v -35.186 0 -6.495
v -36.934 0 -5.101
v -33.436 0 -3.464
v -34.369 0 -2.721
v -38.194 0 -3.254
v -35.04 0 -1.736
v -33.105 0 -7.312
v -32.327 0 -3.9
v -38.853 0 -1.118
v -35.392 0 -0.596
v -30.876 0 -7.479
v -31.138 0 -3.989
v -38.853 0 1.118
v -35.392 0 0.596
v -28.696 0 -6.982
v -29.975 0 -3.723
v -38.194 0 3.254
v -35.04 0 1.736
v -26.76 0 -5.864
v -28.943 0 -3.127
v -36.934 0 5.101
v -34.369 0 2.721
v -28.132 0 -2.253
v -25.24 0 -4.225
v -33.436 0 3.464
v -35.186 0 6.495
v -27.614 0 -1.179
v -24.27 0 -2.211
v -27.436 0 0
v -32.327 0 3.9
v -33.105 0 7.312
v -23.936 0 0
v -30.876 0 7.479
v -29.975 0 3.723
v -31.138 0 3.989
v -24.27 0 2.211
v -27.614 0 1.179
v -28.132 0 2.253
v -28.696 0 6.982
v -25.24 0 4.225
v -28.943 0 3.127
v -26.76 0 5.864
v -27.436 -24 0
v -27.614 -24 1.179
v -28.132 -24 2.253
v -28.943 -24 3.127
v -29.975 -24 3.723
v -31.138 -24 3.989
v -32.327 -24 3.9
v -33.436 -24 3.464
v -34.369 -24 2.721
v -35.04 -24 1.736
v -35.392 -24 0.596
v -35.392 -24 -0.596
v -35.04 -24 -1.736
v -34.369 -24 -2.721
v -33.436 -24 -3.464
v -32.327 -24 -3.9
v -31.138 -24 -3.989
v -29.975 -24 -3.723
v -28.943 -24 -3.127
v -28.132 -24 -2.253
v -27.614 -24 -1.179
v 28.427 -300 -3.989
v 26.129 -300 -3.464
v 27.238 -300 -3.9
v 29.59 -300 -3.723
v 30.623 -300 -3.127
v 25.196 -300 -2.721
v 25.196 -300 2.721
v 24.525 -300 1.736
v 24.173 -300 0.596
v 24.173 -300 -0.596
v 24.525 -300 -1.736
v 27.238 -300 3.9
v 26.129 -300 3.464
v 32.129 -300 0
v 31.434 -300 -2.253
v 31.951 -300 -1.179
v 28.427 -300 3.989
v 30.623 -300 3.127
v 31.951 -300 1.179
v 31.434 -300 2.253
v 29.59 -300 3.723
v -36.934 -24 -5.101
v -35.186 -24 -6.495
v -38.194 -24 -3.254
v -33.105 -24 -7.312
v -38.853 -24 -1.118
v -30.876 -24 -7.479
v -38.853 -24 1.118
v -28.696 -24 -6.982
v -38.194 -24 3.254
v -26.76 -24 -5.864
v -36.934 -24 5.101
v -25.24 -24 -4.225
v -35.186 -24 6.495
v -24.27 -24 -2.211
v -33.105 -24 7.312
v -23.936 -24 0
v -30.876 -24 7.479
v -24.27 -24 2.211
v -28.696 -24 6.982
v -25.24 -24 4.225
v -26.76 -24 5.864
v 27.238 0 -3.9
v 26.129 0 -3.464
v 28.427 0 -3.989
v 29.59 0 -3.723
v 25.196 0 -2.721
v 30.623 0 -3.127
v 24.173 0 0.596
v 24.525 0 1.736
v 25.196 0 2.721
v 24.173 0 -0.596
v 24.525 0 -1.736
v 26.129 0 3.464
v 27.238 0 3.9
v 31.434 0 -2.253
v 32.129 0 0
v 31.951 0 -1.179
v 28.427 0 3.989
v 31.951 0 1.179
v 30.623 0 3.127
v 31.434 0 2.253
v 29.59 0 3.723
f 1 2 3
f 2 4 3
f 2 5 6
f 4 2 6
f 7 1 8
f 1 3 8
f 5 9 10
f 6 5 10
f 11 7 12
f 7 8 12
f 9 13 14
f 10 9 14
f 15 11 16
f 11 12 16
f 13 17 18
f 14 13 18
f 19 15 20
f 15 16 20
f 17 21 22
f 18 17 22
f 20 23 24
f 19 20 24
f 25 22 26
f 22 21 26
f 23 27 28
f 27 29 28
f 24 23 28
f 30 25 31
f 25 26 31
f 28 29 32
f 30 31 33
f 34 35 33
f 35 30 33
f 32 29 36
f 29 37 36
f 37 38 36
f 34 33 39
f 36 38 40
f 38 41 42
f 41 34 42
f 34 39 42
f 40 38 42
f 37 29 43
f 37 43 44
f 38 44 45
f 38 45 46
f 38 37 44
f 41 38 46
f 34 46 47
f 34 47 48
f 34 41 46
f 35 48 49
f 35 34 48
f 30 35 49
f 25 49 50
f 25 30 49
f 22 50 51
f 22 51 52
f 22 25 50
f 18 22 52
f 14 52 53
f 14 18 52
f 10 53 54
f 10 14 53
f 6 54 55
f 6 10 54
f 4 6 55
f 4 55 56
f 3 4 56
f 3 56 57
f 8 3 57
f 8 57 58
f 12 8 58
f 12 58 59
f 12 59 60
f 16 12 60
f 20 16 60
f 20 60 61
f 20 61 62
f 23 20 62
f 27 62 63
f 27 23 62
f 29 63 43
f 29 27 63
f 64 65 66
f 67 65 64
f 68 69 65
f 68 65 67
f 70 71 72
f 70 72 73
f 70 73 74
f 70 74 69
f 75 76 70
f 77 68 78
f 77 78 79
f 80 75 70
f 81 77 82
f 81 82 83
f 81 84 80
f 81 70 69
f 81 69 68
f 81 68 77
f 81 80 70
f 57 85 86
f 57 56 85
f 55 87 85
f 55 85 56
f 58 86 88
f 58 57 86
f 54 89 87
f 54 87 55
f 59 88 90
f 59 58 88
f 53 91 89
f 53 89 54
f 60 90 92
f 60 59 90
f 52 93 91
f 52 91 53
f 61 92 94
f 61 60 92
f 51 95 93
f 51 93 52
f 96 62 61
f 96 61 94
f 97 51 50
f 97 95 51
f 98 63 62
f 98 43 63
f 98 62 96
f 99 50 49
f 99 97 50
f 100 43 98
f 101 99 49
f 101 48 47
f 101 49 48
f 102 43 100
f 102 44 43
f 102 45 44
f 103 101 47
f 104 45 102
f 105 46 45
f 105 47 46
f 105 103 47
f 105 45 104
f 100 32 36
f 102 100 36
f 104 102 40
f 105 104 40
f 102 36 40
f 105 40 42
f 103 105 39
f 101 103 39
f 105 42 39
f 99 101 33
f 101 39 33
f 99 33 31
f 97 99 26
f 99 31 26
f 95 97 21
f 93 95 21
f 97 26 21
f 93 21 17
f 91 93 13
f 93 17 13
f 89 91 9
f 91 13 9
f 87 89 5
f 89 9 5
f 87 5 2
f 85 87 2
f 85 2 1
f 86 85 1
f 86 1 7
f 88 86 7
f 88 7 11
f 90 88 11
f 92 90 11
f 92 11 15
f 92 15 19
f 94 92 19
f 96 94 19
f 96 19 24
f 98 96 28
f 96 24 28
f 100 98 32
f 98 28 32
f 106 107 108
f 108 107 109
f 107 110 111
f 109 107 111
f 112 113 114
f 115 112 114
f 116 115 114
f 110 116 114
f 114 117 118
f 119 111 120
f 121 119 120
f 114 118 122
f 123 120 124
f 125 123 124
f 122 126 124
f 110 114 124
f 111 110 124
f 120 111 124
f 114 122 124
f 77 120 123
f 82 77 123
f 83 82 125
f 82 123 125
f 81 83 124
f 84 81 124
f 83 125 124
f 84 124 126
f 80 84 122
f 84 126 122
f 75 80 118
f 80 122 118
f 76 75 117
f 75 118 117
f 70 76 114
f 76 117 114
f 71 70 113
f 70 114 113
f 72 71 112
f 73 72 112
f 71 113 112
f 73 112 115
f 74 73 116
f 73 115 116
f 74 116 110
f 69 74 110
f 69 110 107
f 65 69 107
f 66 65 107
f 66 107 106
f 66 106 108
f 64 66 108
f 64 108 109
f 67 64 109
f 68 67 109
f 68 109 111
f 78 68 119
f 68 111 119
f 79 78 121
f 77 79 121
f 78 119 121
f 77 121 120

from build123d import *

# Parameters (mm, degrees)
F0_R     = 7.5
F0_R_2   = 4
F1_DEPTH = 24
F2_DEPTH = 300


with BuildPart() as f1:
    # F0 (on Front) → F1 (new body)
    with BuildSketch(Plane.XZ):
        with Locations((-31.436492, 0)):
            Circle(F0_R)
        with Locations((-31.436492, 0)):
            Circle(F0_R_2, mode=Mode.SUBTRACT)
    extrude(amount=F1_DEPTH)


with BuildPart() as f2:
    # F0 (on Front) → F2 (new body)
    with BuildSketch(Plane.XZ):
        with Locations((28.128557, 0)):
            Circle(F0_R_2)
    extrude(amount=F2_DEPTH)


solid = Compound([f1.part, f2.part])
